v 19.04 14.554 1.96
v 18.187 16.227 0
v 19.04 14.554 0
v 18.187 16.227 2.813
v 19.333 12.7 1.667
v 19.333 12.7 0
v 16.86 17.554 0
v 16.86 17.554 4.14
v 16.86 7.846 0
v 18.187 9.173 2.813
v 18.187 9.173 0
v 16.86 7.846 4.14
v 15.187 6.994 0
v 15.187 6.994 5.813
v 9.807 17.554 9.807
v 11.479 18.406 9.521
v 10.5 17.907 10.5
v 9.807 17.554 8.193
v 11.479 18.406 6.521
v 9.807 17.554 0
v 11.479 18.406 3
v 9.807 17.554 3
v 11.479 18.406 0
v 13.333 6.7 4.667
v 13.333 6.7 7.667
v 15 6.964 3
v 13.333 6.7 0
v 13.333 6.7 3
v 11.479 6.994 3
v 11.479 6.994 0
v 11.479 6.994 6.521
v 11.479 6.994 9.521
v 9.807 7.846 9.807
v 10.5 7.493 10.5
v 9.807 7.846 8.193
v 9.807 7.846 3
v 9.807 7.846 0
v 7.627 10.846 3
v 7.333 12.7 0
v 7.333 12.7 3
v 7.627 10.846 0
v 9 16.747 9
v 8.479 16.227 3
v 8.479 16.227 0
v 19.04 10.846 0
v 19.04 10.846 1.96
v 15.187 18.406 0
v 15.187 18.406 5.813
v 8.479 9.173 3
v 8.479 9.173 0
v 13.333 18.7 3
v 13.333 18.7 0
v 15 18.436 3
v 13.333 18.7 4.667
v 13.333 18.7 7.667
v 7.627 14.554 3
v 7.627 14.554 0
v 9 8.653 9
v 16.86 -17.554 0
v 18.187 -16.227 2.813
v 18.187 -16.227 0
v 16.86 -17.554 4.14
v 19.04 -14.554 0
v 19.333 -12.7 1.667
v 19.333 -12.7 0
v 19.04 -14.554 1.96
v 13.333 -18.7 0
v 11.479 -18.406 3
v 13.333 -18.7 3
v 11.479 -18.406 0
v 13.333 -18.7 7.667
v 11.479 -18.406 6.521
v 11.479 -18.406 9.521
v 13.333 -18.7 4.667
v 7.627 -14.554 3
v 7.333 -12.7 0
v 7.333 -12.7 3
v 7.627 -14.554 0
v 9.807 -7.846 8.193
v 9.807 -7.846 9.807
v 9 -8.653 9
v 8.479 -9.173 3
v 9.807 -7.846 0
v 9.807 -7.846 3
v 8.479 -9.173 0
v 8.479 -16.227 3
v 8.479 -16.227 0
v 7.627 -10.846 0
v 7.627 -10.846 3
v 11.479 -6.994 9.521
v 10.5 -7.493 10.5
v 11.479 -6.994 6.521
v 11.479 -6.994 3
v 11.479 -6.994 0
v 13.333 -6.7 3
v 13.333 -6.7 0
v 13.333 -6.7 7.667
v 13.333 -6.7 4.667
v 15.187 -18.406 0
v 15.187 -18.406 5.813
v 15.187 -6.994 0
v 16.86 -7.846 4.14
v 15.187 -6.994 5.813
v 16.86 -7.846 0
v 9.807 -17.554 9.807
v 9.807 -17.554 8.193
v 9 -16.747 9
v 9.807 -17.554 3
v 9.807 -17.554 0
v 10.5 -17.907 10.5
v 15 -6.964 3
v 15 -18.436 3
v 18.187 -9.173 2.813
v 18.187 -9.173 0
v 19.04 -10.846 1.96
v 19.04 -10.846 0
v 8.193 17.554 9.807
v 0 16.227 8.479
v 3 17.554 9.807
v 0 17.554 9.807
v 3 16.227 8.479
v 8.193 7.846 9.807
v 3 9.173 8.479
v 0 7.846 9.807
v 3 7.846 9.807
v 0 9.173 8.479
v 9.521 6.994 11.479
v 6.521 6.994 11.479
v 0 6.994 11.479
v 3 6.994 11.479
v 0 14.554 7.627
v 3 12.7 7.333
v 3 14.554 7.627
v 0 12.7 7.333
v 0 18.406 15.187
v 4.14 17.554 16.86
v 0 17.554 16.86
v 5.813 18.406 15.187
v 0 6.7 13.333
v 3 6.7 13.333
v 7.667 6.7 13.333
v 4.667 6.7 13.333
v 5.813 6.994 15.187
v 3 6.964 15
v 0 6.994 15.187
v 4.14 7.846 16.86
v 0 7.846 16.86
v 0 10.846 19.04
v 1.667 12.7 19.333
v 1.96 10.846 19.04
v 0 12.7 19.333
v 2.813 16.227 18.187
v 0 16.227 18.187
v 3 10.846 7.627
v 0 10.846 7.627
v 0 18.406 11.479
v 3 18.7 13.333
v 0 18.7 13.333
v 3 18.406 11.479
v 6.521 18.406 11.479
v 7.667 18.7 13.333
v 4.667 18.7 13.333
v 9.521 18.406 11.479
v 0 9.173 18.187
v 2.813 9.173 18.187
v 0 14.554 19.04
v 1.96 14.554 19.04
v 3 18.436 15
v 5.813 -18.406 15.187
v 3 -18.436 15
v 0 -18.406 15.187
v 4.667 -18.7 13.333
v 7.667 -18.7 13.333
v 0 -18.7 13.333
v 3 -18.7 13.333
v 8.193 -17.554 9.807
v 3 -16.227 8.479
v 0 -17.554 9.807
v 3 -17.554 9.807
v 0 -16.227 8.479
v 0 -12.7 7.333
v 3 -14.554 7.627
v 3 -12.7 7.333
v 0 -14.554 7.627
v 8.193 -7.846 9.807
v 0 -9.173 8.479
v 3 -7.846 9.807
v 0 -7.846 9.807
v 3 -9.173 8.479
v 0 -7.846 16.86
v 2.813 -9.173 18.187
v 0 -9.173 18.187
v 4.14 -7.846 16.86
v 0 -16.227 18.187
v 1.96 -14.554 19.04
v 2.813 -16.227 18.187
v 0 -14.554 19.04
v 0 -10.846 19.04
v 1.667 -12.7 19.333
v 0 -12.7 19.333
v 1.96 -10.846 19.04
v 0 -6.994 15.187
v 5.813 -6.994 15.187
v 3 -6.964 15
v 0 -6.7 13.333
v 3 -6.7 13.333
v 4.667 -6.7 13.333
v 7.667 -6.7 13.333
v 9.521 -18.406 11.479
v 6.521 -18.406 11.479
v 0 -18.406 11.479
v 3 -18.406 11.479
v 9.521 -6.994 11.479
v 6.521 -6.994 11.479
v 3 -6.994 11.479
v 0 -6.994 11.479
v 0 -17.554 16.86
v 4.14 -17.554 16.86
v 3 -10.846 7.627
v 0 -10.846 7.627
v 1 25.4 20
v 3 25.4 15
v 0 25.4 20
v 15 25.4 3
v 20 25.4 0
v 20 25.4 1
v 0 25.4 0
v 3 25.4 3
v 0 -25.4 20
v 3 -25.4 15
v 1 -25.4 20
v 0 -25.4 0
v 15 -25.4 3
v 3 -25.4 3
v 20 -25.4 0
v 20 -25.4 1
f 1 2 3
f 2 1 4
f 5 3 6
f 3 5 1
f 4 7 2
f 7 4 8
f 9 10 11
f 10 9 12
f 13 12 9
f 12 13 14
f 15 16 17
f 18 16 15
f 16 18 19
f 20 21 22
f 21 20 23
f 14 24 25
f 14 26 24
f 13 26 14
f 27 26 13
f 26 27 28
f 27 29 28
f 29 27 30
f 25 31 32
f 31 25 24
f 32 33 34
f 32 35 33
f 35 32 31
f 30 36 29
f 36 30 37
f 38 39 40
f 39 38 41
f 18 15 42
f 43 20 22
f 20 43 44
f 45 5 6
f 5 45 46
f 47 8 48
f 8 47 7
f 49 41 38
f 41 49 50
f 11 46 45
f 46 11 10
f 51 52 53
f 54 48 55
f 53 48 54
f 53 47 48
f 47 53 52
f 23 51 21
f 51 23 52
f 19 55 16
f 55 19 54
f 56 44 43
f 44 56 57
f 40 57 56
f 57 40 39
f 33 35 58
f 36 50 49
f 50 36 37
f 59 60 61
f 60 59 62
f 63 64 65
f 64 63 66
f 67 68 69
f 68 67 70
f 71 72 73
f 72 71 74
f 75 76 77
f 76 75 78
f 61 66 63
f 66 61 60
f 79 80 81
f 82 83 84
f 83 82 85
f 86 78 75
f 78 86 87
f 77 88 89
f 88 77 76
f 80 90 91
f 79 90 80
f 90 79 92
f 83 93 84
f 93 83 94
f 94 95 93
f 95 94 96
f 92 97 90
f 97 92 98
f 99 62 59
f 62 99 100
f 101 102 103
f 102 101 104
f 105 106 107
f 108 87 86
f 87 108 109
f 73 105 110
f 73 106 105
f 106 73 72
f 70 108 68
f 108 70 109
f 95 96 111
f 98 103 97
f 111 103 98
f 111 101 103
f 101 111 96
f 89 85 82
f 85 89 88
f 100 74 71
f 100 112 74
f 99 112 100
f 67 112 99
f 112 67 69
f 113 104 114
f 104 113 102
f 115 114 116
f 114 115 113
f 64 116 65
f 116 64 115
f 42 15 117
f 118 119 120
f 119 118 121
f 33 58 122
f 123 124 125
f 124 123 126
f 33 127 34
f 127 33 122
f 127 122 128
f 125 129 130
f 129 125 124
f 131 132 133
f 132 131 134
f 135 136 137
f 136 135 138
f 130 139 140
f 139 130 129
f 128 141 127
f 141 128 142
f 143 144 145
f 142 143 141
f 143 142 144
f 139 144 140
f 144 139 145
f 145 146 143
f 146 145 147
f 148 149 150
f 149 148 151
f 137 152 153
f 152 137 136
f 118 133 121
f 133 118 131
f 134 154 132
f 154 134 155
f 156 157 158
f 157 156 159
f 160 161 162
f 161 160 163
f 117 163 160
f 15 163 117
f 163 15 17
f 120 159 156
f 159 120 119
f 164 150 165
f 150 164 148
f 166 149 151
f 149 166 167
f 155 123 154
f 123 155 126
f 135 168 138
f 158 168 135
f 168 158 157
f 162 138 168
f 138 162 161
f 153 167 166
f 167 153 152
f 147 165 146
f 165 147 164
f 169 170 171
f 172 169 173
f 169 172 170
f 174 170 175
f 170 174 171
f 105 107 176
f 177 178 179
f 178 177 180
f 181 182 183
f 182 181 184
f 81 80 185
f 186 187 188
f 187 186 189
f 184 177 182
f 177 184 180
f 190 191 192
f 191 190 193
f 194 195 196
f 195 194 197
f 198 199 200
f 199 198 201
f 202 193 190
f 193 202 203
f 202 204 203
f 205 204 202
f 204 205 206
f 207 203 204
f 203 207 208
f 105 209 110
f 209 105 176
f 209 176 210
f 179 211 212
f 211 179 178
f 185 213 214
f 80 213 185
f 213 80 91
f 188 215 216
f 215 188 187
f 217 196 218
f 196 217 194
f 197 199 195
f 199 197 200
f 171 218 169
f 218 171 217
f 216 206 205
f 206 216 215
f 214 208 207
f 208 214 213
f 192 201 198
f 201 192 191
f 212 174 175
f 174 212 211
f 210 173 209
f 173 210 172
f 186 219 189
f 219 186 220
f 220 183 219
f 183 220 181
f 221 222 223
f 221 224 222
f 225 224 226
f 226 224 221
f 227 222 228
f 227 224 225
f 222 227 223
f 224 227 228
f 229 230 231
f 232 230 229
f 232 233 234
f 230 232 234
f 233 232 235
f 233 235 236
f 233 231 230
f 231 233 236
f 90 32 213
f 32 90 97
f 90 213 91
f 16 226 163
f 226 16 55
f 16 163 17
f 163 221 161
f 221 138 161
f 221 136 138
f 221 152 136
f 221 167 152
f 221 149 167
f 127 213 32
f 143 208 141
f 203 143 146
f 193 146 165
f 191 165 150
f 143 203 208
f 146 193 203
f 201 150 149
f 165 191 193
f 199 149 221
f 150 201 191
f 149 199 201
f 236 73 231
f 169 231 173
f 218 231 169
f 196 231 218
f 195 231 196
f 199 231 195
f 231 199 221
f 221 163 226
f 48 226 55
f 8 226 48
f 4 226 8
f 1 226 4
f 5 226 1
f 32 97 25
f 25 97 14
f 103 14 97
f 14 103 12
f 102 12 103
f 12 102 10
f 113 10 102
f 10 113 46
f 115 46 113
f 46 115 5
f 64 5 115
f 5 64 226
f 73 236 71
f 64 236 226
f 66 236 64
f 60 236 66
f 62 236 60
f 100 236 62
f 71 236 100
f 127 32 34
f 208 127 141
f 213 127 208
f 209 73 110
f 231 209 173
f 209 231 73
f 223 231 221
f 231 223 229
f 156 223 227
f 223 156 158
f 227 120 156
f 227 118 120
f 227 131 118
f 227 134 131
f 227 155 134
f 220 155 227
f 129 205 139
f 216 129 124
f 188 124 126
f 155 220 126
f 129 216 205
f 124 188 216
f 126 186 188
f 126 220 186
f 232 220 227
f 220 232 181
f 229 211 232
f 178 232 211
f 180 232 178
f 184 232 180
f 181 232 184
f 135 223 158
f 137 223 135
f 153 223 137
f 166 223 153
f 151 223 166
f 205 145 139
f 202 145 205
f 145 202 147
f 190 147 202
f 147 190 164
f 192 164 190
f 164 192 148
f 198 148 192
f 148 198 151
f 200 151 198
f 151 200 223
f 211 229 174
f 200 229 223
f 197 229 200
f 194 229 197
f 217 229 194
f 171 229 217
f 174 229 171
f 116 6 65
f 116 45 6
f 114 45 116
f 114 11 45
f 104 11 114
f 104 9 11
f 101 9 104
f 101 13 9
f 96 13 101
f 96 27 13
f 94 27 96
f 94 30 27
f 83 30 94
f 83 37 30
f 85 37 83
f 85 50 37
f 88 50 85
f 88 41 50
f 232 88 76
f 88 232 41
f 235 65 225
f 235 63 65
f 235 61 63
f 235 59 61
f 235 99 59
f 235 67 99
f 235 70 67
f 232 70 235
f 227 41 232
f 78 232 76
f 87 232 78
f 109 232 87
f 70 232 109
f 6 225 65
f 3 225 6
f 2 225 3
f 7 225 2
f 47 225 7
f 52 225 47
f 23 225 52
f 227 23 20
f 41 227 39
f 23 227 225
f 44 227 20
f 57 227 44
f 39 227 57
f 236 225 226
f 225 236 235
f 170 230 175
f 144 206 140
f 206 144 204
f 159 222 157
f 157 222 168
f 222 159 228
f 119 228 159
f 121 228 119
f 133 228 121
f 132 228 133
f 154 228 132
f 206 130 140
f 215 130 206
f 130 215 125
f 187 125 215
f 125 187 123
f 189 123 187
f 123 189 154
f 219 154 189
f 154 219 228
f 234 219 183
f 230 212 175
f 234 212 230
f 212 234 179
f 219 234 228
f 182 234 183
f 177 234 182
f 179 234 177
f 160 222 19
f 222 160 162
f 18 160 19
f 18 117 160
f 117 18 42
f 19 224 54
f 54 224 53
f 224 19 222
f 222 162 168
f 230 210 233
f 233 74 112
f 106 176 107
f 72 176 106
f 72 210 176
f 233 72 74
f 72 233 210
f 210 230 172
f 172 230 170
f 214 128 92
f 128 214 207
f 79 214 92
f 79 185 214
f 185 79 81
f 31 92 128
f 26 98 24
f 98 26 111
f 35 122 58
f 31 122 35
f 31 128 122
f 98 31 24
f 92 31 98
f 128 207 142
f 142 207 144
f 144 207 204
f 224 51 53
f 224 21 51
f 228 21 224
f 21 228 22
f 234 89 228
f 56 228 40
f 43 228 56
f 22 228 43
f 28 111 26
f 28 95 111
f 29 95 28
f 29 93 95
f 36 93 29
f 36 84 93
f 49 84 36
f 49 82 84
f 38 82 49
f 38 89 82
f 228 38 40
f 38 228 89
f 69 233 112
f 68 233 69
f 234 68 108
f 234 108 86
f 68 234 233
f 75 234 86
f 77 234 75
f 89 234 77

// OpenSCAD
//Frode Lillerud, 08.des.2014

module cornerBracket(height=20, width=20, depth=(2*25.4),screwdiameter=6) {
    //color("lightgrey") 
    difference() {
        translate([0, depth/2, 0])
        rotate([90, 0, 0])
        linear_extrude(height=depth, convexity=2)
        difference() {
            polygon(
                points = [
                    [0,0],[width,0], [width,1], [1, height], [0,height]
                ],
                paths = [
                    [0,1,2,3,4]
                ]);
            polygon(
            points = [
                [3,3], [width-5, 3], [3, height-5]
            ],
            paths = [
                [0,1,2]
        ]);
        }
        union() {
            //The four screwholes
            translate([width/1.5, depth/4, -1]) cylinder(height*2, r=screwdiameter, $fn=20);
            mirror([0,1,0]) translate([width/1.5, depth/4, -1]) cylinder(height*2, r=screwdiameter, $fn=20);
            translate([-1, depth/4, width/1.5]) rotate([0, 90, 0]) cylinder(height*2, r=screwdiameter, $fn=20);
            mirror([0,1,0]) translate([-1, depth/4, width/1.5]) rotate([0, 90, 0]) cylinder(height*2, r=screwdiameter, $fn=20);
        }
        //!linear_extrude(height=depth)
        
    }
}

cornerBracket();
